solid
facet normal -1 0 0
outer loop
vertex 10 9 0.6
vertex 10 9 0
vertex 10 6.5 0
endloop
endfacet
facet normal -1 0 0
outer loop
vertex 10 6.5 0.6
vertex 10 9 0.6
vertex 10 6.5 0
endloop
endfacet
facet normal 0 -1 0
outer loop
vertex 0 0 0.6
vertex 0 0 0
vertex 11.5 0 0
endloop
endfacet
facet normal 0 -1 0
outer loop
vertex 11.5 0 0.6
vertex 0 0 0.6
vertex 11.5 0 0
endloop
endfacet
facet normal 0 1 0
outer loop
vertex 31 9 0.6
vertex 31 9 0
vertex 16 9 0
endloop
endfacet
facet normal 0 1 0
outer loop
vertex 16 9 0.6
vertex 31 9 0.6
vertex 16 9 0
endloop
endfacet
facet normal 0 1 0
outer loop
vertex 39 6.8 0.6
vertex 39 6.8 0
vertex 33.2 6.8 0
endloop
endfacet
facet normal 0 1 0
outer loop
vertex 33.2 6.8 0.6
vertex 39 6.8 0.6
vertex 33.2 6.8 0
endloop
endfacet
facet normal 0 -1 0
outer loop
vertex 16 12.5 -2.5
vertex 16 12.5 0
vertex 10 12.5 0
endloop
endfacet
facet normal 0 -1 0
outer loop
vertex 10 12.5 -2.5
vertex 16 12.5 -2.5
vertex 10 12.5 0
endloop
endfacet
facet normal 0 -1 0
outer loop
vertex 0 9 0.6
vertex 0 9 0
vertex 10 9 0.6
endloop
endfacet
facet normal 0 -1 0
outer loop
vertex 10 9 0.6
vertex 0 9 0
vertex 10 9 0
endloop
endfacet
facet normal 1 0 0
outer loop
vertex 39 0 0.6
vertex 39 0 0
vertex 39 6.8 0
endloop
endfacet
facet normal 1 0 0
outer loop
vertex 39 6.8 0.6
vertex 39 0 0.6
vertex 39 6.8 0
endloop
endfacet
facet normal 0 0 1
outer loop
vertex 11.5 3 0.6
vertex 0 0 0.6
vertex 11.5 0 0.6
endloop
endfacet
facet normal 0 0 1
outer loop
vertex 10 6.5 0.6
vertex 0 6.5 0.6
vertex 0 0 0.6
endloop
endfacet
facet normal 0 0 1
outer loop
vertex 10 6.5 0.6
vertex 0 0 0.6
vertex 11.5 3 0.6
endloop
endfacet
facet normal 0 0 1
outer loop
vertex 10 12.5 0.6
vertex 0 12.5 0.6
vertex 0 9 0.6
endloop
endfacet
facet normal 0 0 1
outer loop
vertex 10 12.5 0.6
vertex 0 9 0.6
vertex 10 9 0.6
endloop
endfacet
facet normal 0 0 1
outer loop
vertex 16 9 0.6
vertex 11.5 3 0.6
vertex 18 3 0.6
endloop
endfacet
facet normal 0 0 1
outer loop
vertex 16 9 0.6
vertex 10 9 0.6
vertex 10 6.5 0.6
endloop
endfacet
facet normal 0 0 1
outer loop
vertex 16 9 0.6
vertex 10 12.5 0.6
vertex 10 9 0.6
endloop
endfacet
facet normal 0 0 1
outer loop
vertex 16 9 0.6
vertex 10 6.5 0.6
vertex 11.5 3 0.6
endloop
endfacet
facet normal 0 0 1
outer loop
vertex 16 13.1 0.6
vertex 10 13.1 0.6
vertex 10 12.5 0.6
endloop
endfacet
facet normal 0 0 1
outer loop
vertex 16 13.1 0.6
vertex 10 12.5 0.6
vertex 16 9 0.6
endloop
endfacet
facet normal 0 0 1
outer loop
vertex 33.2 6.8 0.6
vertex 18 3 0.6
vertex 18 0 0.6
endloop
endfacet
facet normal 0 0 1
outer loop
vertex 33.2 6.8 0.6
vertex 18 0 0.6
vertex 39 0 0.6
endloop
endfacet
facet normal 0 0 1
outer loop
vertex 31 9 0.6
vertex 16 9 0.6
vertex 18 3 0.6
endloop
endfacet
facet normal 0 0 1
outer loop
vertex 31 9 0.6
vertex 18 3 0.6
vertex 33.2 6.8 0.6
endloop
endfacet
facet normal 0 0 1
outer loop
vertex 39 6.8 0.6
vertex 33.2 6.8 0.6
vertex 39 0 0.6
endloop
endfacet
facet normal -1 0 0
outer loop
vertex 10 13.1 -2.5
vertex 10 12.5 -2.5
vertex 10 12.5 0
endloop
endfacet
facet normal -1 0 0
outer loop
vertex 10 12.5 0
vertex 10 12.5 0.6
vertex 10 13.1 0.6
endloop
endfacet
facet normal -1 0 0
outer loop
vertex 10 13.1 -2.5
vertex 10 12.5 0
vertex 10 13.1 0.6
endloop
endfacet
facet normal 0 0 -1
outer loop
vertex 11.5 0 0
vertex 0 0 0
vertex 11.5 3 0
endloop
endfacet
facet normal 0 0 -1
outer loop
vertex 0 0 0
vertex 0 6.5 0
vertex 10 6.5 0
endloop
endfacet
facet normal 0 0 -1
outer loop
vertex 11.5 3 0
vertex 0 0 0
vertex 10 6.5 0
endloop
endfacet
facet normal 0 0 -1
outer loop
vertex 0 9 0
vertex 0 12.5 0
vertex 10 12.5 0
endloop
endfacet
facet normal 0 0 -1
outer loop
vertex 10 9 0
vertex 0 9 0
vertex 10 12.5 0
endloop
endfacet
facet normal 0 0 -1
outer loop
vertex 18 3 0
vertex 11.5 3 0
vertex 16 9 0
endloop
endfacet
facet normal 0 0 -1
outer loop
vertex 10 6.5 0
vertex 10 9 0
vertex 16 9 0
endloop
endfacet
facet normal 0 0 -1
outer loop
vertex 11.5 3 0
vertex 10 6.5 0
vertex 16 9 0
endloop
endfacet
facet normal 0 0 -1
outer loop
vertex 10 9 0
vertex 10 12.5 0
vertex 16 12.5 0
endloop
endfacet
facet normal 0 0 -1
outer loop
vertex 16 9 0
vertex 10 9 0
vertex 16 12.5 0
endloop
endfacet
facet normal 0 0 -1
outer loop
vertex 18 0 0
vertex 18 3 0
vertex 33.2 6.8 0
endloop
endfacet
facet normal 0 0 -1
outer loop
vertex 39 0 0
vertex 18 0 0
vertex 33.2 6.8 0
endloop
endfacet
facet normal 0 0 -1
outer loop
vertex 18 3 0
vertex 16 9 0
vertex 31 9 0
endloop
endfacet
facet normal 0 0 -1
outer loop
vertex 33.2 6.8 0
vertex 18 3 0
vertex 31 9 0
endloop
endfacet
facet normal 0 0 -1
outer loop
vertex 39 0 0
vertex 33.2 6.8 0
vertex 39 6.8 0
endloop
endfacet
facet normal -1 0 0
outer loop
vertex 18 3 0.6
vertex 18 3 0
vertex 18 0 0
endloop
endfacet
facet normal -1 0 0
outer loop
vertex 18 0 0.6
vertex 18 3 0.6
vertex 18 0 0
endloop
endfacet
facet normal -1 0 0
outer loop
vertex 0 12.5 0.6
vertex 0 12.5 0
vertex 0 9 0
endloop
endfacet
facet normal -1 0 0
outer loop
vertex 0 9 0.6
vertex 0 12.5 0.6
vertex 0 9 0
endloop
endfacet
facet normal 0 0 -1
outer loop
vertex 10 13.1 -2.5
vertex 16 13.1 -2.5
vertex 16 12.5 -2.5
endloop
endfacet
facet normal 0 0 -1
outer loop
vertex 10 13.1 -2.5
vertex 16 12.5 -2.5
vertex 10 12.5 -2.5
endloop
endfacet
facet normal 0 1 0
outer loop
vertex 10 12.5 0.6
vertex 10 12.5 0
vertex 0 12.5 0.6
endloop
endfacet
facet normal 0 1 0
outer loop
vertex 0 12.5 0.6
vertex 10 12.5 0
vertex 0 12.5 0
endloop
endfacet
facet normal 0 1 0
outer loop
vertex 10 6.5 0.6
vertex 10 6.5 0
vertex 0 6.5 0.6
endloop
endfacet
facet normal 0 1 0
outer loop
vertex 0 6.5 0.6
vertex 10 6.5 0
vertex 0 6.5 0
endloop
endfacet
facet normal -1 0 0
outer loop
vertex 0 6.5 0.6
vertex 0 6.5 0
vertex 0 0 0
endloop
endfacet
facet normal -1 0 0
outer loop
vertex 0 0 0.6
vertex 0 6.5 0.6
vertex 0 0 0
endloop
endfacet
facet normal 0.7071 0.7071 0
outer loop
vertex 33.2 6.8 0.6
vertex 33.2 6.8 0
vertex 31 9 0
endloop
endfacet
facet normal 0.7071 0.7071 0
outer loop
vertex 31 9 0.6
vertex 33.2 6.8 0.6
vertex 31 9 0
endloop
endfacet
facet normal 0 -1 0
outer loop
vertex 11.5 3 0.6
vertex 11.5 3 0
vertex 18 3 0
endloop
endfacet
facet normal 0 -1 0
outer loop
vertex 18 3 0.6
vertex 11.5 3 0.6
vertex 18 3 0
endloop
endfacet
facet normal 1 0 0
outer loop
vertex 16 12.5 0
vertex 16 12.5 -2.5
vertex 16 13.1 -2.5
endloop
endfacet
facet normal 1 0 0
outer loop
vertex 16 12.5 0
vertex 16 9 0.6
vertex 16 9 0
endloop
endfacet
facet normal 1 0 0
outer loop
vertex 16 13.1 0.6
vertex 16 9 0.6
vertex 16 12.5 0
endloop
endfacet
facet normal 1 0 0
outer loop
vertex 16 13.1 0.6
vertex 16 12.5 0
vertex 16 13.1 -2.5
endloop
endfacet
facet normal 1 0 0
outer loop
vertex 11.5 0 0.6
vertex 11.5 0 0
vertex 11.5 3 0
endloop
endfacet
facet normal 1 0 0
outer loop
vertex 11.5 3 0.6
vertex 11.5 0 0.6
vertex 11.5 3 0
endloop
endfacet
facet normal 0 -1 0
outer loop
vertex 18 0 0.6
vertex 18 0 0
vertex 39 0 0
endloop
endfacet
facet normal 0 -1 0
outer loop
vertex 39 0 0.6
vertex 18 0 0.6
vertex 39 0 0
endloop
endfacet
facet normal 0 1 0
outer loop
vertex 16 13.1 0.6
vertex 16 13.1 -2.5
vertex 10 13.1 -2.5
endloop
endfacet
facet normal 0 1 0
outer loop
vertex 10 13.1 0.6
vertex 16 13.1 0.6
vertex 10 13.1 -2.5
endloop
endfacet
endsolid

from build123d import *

# Parameters (mm, degrees)
EXTRUDE_1_DEPTH     = 0.6
SKETCH_2_W          = 6
SKETCH_2_H          = 0.6
EXTRUDE_2_DEPTH     = 2.5
SKETCH_3_W          = 6
SKETCH_3_H          = 1.9
CUT_EXTRUDE_1_DEPTH = 42.859885332


with BuildPart() as part:
    # 草图1 → 凸台-拉伸1 (new body)
    with BuildSketch(Plane.XY):
        Polygon((0, 0), (11.5, 0), (11.5, 3), (18, 3), (18, 0), (39, 0), (39, 6.8), (33.2, 6.8), (31, 9), (16, 9), (16, 15), (10, 15), (10, 12.5), (0, 12.5), (0, 9), (10, 9), (10, 6.5), (0, 6.5), align=None)
    extrude(amount=EXTRUDE_1_DEPTH)

    # 草图2 → 凸台-拉伸2 (add)
    with BuildSketch(Plane(origin=(0, 0, 0), x_dir=(-1, 0, 0), z_dir=(0, 0, -1))):
        with Locations((-13, 12.8)):
            Rectangle(SKETCH_2_W, SKETCH_2_H)
    extrude(amount=EXTRUDE_2_DEPTH)

    # 草图3 → 切除-拉伸1 (cut, through all)
    with BuildSketch(Plane(origin=(0, 0, 0), x_dir=(-1, 0, 0), z_dir=(0, 0, -1))):
        with Locations((-13, 14.05)):
            Rectangle(SKETCH_3_W, SKETCH_3_H)
    extrude(amount=-CUT_EXTRUDE_1_DEPTH, mode=Mode.SUBTRACT)


solid = part.part
